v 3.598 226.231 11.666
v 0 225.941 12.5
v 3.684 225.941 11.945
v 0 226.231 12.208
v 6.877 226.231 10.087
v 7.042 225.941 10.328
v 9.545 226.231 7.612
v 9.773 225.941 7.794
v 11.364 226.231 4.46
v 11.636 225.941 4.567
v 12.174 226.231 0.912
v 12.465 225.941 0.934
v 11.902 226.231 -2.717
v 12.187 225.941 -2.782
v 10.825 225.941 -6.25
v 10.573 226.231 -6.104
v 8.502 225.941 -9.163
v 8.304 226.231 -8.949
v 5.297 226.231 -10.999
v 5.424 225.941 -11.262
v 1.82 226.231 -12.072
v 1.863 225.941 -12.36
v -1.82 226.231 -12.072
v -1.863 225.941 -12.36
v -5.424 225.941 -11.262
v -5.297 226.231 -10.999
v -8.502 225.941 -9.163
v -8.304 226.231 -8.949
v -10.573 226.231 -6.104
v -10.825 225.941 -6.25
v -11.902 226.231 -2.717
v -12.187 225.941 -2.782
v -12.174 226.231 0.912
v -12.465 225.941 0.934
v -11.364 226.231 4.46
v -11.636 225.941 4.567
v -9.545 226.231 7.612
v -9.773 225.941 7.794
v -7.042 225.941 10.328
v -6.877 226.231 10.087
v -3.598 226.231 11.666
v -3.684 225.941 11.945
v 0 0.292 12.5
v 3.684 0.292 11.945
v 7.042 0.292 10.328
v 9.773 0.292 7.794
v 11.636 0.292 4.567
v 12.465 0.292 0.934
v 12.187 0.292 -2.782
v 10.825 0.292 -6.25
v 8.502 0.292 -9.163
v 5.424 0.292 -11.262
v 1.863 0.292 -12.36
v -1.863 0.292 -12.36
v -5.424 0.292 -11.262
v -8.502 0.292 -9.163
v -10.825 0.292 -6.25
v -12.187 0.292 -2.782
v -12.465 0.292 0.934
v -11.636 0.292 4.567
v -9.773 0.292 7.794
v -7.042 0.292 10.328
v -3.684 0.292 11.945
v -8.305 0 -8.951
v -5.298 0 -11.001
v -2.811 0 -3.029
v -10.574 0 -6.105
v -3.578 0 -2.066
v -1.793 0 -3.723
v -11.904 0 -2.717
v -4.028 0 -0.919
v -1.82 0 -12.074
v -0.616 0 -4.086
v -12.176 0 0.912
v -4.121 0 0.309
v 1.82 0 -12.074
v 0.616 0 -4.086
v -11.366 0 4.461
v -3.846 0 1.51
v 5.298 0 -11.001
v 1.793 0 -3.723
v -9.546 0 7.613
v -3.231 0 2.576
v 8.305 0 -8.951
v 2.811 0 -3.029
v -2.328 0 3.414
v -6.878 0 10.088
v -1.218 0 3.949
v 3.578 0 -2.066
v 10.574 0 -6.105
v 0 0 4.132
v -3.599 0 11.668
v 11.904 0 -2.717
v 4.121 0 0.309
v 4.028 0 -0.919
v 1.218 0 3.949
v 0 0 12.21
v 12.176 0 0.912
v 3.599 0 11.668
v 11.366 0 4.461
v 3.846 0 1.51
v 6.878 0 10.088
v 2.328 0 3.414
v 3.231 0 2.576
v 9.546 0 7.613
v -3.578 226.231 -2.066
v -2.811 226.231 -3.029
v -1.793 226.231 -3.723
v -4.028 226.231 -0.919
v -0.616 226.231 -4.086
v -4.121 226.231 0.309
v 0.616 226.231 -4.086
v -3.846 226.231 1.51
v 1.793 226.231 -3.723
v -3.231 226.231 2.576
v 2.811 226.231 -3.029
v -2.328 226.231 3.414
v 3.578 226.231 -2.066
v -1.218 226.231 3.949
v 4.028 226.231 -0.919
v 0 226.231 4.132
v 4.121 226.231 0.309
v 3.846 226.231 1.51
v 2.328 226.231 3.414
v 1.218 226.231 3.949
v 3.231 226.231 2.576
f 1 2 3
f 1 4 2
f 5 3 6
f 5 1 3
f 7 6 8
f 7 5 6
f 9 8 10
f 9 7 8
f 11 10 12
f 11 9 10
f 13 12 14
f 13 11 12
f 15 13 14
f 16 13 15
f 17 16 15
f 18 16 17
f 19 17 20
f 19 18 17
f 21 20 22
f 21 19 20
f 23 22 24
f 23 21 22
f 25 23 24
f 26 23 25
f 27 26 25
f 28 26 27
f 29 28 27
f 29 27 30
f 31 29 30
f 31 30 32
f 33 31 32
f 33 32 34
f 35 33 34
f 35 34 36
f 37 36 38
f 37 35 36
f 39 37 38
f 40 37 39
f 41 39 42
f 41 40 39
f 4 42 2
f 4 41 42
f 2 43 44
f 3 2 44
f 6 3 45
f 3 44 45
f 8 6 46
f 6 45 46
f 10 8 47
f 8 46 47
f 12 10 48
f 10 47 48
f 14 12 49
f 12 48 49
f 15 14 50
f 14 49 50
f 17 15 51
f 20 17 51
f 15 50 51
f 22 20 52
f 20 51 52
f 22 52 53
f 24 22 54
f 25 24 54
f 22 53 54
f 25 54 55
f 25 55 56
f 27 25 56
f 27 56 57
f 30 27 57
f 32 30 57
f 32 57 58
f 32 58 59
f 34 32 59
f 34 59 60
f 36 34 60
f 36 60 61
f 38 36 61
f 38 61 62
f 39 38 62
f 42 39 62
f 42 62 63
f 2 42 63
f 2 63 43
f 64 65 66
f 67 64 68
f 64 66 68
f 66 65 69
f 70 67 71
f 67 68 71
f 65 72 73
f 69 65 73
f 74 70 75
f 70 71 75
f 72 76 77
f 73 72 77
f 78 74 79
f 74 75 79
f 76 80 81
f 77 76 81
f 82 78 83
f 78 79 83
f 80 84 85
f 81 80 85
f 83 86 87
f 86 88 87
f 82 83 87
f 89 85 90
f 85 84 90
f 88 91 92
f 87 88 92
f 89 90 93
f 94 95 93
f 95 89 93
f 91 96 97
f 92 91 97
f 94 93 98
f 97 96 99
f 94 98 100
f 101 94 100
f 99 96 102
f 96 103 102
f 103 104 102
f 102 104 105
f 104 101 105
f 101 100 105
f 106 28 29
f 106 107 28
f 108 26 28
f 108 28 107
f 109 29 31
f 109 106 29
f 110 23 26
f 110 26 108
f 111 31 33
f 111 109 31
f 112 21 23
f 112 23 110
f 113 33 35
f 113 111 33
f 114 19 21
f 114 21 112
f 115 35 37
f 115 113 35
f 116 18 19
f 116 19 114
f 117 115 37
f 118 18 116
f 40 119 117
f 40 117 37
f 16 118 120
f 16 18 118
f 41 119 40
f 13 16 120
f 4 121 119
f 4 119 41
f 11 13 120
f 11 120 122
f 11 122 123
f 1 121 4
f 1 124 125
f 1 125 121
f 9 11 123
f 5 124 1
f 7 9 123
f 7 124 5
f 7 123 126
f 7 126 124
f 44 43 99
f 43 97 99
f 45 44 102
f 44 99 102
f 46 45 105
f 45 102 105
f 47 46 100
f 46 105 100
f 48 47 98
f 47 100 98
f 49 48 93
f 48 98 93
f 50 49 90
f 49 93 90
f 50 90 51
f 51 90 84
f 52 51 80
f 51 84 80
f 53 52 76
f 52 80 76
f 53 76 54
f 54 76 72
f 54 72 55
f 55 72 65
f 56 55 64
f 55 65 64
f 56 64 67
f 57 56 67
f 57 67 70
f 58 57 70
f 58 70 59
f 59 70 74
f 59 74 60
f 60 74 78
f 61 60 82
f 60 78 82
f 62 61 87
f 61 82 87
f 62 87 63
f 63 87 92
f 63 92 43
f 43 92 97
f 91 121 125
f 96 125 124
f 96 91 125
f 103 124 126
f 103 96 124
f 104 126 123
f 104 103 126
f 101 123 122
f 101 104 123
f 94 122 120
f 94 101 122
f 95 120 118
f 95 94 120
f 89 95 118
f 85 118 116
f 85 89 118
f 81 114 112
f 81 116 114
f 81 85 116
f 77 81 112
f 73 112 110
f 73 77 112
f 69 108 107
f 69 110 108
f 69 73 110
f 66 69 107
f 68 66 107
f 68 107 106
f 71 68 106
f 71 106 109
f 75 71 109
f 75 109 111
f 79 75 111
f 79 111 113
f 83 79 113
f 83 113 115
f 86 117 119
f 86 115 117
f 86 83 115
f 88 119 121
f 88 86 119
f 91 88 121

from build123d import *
from OCP.BRepFilletAPI import BRepFilletAPI_MakeChamfer

# Parameters (mm, degrees)
SKETCH1_R           = 12.5
BOSS_EXTRUDE1_DEPTH = 226.231428448
SKETCH2_R           = 4.132090217
CUT_EXTRUDE1_DEPTH  = 227.921041813
CHAMFER1_SIZE       = 0.2899335
CHAMFER1_SIZE2      = 0.291605895


with BuildPart() as part:
    # Sketch1 → Boss-Extrude1 (new body)
    with BuildSketch(Plane(origin=(0, 0, 0), x_dir=(1, 0, 0), z_dir=(0, 1, 0))):
        Circle(SKETCH1_R)
    extrude(amount=BOSS_EXTRUDE1_DEPTH)

    # Sketch2 → Cut-Extrude1 (cut, through all)
    with BuildSketch(Plane(origin=(0, 0, 0), x_dir=(1, 0, 0), z_dir=(0, 1, 0))):
        Circle(SKETCH2_R)
    extrude(amount=CUT_EXTRUDE1_DEPTH, mode=Mode.SUBTRACT)

    # Chamfer1: one chamfer whose edges measure the first distance from different faces: ONE call of the kernel's chamfer builder (chamfer() names one face for all edges)
    chamfer1_edges_1 = [part.edges().sort_by_distance(p)[0] for p in [
        (-12.5, 226.231428448, 0),
    ]]
    chamfer1_side_1 = [part.faces().sort_by_distance(p)[0] for p in [
        (-12.5, 113.115714224, 0),
    ]]
    chamfer1_edges_2 = [part.edges().sort_by_distance(p)[0] for p in [
        (-12.5, 0, 0),
    ]]
    chamfer1_side_2 = [part.faces().sort_by_distance(p)[0] for p in [
        (-12.146446609, 0, 0),
    ]]
    chamfer1 = BRepFilletAPI_MakeChamfer(part.part.solid().wrapped)
    for e in chamfer1_edges_1:
        chamfer1.Add(CHAMFER1_SIZE, CHAMFER1_SIZE2, e.wrapped, chamfer1_side_1[0].wrapped)  # the first distance lies on this face
    for e in chamfer1_edges_2:
        chamfer1.Add(CHAMFER1_SIZE, CHAMFER1_SIZE2, e.wrapped, chamfer1_side_2[0].wrapped)  # the first distance lies on this face
    add(Compound.cast(chamfer1.Shape()), mode=Mode.REPLACE)


solid = part.part
